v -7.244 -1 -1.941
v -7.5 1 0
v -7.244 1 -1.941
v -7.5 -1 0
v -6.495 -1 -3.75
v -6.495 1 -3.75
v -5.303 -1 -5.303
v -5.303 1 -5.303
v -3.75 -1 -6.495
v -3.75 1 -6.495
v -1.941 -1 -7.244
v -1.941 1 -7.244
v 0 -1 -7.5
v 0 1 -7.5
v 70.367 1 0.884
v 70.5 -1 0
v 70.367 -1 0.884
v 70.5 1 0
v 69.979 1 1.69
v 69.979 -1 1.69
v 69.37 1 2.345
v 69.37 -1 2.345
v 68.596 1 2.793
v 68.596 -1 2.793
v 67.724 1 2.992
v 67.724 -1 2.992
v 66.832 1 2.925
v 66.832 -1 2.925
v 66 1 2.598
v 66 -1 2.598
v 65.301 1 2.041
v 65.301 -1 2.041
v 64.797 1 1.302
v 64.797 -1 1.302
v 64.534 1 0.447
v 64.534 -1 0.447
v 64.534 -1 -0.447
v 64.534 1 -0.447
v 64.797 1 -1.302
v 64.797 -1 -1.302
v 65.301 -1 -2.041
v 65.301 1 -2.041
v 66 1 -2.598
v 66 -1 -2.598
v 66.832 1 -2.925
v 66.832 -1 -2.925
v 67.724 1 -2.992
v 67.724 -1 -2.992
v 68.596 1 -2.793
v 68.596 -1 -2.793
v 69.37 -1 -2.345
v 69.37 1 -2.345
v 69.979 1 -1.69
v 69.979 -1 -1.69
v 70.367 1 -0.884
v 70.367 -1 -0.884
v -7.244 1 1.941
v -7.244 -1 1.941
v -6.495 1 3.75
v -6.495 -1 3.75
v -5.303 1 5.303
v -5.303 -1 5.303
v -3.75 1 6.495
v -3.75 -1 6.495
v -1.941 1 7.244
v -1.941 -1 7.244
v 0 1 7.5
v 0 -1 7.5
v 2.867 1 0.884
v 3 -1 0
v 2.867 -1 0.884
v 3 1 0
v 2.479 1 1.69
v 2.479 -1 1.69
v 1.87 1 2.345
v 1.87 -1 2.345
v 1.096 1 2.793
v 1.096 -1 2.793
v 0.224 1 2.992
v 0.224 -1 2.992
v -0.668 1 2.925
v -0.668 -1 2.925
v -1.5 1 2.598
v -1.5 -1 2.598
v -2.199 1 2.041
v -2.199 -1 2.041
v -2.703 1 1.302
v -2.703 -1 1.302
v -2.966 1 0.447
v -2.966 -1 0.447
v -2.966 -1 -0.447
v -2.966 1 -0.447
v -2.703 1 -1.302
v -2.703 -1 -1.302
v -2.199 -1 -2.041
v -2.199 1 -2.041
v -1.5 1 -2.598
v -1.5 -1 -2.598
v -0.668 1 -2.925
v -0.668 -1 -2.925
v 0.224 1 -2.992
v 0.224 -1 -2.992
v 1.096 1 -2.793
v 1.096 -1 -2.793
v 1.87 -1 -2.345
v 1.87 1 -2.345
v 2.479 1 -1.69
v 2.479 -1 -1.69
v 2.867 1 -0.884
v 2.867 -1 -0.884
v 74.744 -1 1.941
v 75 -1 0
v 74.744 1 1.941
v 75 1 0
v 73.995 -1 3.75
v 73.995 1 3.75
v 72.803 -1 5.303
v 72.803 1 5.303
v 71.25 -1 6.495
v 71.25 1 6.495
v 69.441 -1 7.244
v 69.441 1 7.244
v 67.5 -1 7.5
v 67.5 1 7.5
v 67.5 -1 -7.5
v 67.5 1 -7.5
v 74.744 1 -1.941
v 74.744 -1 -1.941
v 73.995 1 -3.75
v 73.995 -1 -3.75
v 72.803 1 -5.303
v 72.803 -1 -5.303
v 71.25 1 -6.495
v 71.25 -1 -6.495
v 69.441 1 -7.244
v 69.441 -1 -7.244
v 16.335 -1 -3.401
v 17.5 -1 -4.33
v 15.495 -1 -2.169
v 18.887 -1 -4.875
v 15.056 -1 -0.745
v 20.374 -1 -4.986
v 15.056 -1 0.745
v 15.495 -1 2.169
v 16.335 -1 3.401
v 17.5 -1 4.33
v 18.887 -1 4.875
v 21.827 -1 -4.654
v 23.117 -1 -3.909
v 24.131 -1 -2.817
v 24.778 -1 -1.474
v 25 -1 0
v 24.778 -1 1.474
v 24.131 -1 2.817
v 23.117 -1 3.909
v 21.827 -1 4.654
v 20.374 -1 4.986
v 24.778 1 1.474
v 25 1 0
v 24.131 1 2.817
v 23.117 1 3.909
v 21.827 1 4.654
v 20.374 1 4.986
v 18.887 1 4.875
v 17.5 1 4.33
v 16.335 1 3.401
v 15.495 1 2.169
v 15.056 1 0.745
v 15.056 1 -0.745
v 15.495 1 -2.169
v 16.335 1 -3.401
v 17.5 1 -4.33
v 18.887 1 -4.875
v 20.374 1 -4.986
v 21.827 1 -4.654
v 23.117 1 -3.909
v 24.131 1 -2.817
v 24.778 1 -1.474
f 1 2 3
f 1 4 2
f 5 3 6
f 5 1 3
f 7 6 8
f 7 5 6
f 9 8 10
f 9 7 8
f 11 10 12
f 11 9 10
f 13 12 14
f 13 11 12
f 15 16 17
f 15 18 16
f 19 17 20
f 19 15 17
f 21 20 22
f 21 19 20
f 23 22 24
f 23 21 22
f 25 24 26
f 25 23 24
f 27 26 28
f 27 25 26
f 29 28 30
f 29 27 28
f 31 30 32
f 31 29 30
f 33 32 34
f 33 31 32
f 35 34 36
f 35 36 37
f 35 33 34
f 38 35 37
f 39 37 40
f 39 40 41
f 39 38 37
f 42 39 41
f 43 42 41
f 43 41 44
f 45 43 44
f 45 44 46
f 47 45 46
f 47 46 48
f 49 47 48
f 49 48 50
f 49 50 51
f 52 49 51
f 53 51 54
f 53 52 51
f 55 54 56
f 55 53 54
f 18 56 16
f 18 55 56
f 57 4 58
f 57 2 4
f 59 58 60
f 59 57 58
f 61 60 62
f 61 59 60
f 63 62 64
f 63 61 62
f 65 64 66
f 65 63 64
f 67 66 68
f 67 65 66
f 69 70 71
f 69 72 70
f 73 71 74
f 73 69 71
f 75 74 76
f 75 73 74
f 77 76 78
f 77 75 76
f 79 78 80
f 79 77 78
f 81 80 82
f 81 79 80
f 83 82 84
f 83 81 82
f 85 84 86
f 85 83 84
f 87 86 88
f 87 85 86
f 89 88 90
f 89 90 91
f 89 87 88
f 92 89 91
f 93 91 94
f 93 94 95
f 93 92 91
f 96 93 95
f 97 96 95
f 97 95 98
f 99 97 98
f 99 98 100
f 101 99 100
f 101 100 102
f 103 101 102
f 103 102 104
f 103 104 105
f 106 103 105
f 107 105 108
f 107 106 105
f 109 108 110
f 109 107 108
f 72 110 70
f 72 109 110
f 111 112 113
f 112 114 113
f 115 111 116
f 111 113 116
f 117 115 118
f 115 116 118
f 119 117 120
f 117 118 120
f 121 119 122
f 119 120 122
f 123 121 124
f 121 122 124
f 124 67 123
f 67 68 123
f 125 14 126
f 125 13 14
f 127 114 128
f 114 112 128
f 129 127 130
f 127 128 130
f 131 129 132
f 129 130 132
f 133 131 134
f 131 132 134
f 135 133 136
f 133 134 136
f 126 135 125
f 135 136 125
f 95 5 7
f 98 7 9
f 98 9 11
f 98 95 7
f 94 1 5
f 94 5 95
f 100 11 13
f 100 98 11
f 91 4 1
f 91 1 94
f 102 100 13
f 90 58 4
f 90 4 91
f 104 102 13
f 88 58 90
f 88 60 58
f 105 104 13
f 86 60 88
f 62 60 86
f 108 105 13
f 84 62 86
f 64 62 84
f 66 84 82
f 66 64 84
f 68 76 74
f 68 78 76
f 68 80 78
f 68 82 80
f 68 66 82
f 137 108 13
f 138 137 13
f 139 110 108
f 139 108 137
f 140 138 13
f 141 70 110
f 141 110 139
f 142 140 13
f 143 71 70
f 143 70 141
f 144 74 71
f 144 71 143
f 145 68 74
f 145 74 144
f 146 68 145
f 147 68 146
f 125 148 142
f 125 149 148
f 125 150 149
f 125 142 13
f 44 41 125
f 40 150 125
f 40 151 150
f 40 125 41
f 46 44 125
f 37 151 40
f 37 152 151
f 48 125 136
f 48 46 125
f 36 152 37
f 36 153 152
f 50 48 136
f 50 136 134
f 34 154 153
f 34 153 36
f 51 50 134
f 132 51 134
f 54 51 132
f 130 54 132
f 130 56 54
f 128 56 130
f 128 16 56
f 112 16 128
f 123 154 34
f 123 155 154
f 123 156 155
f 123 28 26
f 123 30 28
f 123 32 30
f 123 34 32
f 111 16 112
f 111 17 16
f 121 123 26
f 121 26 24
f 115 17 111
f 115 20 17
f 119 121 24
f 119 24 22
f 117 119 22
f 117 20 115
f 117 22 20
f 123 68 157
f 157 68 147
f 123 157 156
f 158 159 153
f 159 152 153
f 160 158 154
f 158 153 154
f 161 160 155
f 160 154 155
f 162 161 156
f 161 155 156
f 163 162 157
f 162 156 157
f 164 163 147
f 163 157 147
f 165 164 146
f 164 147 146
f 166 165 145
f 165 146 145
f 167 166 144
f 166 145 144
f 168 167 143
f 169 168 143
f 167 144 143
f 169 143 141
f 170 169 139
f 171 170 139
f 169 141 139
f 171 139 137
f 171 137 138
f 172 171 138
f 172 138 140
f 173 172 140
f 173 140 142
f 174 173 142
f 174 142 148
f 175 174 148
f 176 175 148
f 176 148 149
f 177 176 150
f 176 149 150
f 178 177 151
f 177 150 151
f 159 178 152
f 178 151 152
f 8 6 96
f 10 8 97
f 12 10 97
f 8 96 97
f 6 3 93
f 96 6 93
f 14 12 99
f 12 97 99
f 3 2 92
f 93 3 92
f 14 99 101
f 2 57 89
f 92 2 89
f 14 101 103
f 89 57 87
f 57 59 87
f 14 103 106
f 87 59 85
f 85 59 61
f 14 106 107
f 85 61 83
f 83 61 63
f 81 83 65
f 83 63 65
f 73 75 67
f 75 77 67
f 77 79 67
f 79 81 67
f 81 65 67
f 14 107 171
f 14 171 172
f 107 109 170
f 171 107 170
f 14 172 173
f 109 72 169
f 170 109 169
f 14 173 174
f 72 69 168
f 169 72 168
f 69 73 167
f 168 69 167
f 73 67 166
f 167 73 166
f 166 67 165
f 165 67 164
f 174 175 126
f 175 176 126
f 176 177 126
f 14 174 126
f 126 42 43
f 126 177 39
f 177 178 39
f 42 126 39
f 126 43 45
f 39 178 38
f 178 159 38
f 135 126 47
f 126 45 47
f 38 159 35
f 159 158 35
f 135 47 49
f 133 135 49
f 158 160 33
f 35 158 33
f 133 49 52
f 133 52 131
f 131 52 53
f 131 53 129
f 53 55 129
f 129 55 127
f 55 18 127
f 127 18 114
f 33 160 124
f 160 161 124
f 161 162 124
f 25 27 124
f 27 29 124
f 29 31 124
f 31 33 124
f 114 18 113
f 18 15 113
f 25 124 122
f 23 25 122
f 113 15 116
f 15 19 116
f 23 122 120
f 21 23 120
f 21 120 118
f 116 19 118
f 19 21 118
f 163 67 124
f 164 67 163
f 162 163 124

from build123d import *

# Parameters (mm, degrees)
F0_W     = 82.5
F0_H     = 15
F0_R     = 3
F1_DEPTH = 1
F2_R     = 7.49999
F3_R     = 5
F4_DEPTH = 12.5


# Not quite as in the source:
# - a fillet or chamfer is up to 0.001 mm smaller than in the source, because OpenCascade refuses the exact size


with BuildPart() as f1:
    # F0 (on Front) → F1 (new body, symmetric)
    with BuildSketch(Plane.XZ):
        with Locations((33.75, 0)):
            Rectangle(F0_W, F0_H)
        Circle(F0_R, mode=Mode.SUBTRACT)
        with Locations((67.5, 0)):
            Circle(F0_R, mode=Mode.SUBTRACT)
    extrude(amount=F1_DEPTH, both=True)

    # F2 (radius 7.5 in the source; OpenCascade refuses exactly that, so slightly less here)
    f2_edges = [f1.edges().sort_by_distance(p)[0] for p in [
        (75, 0, 7.5),
        (75, 0, -7.5),
        (-7.5, 0, 7.5),
        (-7.5, 0, -7.5),
    ]]
    fillet(f2_edges, radius=F2_R)

    # F3 (on Front) → F4 (cut, symmetric)
    with BuildSketch(Plane.XZ):
        with Locations((20, 0)):
            Circle(F3_R)
    extrude(amount=F4_DEPTH, both=True, mode=Mode.SUBTRACT)


solid = f1.part
